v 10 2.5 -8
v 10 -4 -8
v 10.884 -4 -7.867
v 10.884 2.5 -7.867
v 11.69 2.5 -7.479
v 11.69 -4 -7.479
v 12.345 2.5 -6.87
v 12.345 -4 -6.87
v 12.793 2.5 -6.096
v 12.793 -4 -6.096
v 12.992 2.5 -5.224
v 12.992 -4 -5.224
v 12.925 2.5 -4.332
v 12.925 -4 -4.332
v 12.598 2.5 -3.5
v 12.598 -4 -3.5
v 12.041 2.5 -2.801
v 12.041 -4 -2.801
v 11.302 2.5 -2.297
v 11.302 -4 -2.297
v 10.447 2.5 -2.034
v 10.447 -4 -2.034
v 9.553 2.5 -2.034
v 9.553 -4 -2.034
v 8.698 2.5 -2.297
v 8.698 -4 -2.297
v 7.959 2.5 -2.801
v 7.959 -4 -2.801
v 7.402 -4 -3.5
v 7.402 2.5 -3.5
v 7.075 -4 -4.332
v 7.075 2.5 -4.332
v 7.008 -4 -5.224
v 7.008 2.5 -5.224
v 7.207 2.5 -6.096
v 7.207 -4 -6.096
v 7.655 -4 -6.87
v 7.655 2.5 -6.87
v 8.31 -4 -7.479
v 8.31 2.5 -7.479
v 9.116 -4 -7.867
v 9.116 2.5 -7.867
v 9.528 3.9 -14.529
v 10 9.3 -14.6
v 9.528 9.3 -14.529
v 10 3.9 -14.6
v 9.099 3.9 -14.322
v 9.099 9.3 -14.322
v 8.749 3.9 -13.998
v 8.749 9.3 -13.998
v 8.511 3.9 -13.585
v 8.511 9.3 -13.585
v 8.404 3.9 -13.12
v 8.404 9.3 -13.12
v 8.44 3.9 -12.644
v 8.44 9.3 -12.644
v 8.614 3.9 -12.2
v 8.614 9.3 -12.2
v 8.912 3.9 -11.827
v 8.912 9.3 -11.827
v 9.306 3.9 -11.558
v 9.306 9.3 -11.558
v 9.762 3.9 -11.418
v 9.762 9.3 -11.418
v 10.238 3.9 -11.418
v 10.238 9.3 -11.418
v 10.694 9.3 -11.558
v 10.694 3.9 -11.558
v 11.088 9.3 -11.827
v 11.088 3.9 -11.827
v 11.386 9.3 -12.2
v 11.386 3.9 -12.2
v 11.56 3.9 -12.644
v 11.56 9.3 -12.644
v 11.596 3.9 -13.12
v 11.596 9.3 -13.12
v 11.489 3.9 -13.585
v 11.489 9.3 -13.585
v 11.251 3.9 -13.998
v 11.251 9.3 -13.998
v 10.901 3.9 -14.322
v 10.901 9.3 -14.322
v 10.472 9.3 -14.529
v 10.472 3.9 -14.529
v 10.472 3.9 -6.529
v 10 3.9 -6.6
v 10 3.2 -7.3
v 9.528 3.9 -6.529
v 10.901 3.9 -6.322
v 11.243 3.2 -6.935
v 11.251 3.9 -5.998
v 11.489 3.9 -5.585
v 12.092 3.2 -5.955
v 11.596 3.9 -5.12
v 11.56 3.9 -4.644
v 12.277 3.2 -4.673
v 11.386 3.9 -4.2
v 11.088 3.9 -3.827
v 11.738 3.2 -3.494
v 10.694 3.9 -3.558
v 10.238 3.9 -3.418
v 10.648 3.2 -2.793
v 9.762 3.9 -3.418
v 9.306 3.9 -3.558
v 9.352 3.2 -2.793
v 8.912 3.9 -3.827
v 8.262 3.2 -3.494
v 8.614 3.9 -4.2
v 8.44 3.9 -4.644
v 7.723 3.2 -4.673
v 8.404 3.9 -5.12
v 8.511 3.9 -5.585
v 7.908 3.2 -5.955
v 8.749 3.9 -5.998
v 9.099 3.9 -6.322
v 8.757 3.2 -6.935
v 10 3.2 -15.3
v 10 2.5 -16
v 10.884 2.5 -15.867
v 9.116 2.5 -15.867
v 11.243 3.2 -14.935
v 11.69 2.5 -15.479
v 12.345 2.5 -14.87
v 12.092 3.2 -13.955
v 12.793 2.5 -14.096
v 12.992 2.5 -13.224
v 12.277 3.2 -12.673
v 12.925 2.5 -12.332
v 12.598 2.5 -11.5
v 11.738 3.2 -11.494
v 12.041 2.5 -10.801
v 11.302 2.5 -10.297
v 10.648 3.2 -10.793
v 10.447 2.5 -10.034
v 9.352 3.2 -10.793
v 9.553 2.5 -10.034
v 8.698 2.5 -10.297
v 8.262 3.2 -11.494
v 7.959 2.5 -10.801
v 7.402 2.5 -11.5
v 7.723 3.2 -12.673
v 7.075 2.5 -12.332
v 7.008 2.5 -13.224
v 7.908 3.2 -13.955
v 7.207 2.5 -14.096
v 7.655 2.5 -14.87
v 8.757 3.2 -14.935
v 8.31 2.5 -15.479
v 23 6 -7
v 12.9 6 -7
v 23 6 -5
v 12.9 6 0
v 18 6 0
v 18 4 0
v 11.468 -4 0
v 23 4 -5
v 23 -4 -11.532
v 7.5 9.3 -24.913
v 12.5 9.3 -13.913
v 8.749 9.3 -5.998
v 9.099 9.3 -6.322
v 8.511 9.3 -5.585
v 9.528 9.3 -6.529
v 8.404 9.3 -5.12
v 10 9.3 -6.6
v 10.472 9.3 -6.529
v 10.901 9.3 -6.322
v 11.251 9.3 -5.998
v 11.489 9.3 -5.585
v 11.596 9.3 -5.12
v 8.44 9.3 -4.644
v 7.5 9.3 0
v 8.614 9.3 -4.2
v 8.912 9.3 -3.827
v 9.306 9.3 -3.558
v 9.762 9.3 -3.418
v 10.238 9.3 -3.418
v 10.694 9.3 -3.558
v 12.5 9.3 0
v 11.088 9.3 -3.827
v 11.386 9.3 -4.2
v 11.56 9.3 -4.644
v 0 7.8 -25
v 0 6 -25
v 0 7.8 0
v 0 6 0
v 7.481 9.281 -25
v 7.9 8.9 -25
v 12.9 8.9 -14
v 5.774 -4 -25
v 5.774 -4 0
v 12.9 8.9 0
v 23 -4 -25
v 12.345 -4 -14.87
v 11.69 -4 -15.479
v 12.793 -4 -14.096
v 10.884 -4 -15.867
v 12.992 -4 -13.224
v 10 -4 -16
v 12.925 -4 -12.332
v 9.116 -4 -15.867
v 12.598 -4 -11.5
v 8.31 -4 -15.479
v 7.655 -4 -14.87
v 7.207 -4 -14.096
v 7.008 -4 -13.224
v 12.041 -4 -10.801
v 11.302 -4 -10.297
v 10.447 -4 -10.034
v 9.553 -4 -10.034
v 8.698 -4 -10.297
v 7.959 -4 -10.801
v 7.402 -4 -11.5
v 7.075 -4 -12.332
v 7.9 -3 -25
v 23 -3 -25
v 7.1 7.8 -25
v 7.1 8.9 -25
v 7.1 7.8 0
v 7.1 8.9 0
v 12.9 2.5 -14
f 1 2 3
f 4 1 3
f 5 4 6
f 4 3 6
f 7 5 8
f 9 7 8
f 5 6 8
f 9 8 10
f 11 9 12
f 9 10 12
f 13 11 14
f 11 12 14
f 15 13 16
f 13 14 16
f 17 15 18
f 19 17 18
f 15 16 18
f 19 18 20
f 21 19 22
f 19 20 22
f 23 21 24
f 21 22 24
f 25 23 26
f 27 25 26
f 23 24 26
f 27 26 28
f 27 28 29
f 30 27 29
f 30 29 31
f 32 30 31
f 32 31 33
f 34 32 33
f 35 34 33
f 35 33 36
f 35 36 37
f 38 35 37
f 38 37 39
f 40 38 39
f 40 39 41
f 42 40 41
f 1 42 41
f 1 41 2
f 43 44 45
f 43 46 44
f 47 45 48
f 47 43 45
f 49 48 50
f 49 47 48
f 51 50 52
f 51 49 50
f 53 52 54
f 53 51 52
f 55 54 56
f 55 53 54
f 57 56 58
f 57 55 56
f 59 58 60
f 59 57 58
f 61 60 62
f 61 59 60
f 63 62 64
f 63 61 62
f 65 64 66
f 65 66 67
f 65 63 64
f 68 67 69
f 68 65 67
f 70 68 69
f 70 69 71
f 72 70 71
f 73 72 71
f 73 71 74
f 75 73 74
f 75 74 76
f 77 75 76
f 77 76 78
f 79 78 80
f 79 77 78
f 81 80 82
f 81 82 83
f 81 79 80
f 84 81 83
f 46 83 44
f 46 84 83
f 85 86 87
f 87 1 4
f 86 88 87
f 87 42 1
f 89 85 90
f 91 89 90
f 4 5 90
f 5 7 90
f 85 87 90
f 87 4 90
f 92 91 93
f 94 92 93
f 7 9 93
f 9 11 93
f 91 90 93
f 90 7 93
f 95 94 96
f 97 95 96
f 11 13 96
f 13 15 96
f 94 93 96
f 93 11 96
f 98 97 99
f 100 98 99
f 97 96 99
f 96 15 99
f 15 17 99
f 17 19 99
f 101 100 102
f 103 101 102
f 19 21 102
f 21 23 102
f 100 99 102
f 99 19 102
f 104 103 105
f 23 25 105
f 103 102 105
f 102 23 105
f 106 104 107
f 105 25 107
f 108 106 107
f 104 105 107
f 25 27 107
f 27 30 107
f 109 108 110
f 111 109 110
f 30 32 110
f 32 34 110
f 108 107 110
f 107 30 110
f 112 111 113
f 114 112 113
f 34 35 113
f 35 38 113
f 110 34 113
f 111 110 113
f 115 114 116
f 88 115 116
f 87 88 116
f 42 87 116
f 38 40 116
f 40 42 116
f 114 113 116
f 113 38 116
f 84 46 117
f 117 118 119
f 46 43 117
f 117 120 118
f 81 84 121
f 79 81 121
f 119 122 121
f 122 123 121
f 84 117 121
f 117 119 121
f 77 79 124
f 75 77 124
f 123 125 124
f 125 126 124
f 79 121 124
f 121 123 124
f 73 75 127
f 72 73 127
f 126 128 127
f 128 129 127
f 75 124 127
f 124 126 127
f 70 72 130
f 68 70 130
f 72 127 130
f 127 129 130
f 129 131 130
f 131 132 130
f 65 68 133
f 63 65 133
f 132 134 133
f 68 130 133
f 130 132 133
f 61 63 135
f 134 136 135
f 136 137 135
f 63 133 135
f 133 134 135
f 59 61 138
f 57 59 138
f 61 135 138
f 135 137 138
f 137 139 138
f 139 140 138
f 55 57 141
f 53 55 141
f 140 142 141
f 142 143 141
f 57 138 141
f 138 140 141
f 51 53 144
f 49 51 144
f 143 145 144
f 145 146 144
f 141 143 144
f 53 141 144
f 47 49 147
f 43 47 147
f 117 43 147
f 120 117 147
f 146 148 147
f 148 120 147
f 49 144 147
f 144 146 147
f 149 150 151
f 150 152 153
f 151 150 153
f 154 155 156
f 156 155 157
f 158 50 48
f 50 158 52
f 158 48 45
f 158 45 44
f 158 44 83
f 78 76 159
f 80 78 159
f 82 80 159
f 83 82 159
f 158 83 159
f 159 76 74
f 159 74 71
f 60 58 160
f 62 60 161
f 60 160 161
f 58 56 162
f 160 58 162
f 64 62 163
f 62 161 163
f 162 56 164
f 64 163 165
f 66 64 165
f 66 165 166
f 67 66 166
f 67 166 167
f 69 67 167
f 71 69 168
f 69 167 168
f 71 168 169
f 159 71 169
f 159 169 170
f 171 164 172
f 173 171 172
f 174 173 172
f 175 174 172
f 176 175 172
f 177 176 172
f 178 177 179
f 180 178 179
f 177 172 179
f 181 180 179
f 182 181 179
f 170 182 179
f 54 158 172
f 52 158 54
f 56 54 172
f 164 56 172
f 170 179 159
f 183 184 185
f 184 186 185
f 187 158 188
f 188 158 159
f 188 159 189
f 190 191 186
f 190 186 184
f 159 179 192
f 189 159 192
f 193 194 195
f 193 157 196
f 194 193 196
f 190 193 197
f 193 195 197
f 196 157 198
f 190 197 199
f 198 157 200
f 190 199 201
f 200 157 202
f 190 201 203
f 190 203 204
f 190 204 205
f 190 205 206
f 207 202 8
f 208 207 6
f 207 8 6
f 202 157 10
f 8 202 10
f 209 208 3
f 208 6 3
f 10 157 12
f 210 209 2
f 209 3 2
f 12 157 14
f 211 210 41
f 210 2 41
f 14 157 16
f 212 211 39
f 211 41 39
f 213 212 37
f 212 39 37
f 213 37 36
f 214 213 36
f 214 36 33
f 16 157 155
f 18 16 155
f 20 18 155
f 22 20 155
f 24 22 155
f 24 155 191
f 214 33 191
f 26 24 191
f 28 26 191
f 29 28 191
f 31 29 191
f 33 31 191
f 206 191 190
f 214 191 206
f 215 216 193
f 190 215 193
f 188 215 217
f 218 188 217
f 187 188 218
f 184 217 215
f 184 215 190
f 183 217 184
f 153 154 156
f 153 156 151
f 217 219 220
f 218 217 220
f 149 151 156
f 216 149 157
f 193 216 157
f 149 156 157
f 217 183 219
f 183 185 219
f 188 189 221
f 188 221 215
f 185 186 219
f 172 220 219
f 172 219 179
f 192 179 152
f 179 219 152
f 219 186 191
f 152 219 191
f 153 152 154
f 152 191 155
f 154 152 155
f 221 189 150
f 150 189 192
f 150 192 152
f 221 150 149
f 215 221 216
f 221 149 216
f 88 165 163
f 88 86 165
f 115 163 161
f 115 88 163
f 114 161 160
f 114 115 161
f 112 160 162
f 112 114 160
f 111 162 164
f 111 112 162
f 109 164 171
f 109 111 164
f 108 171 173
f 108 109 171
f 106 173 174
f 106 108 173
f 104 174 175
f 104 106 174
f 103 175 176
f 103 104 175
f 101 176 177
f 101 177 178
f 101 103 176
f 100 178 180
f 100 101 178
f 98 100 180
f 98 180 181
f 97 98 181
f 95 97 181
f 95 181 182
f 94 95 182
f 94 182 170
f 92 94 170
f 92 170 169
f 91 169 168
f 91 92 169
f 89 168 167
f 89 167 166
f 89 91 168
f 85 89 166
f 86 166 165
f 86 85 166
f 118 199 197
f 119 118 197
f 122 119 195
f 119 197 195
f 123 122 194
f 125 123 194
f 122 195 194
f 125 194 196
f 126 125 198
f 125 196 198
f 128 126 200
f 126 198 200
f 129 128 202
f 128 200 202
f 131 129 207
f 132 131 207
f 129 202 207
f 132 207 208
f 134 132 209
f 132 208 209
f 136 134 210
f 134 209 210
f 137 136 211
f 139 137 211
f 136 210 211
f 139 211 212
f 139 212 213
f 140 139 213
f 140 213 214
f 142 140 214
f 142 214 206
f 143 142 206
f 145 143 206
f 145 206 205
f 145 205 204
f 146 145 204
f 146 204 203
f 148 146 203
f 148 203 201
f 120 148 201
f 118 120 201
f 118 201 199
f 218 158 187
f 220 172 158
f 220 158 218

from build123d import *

# Parameters (mm, degrees)
SKETCH_1_W           = 20
SKETCH_1_H           = 20
EXTRUDE_1_DEPTH      = 4
SKETCH_2_W           = 12.9
SKETCH_2_H           = 20
EXTRUDE_2_DEPTH      = 3.8
SKETCH_3_R           = 1.6
CUT_EXTRUDE_1_DEPTH  = 30.340074983
SKETCH_4_W           = 5.8
SKETCH_4_H           = 20
SKETCH_4_R           = 1.6
EXTRUDE_3_DEPTH      = 1.5
SKETCH_5_R           = 3
CUT_EXTRUDE_3_DEPTH  = 2.4
SKETCH_6_W           = 20
SKETCH_6_H           = 4
EXTRUDE_4_DEPTH      = 3
EXTRUDE_START        = 4
SKETCH_7_W           = 23
SKETCH_7_H           = 20
SKETCH_7_R           = 3
EXTRUDE_5_DEPTH      = 4
SKETCH_9_W           = 10.1
SKETCH_9_H           = 20
EXTRUDE_6_DEPTH      = 2
EXTRUDE_7_DEPTH      = 5
CHAMFER_7_SIZE       = 10
CHAMFER_7_SIZE2      = 5.773502692
CHAMFER_8_SIZE       = 5
CHAMFER_9_SIZE       = 8
CHAMFER_9_SIZE2      = 4.618802154
CUT_EXTRUDE_9_DEPTH  = 10.1
CUT_EXTRUDE_10_REACH = 38.481
CHAMFER_10_SIZE      = 1.5
CHAMFER_11_SIZE      = 0.4


with BuildPart() as part:
    # 草图1 → 凸台-拉伸1 (new body)
    with BuildSketch(Plane(origin=(0, 0, 0), x_dir=(1, 0, 0), z_dir=(0, 1, 0))):
        with Locations((10, 10)):
            Rectangle(SKETCH_1_W, SKETCH_1_H)
    extrude(amount=EXTRUDE_1_DEPTH)

    # 草图2 → 凸台-拉伸2 (add)
    with BuildSketch(Plane(origin=(0, 4, 0), x_dir=(1, 0, 0), z_dir=(0, 1, 0))):
        with Locations((6.45, 10)):
            Rectangle(SKETCH_2_W, SKETCH_2_H)
    extrude(amount=EXTRUDE_2_DEPTH)

    # 草图3 → 切除-拉伸1 (cut, through all)
    with BuildSketch(Plane(origin=(0, 0, 0), x_dir=(-1, 0, 0), z_dir=(0, -1, 0))):
        with Locations(Location((-10, 5, 0), (0, 0, 90))):
            Circle(SKETCH_3_R)
        with Locations(Location((-10, 13, 0), (0, 0, 90))):
            Circle(SKETCH_3_R)
    extrude(amount=-CUT_EXTRUDE_1_DEPTH, mode=Mode.SUBTRACT)

    # 草图4 → 凸台-拉伸3 (add)
    with BuildSketch(Plane(origin=(0, 7.8, 0), x_dir=(1, 0, 0), z_dir=(0, 1, 0))):
        with Locations((10, 10)):
            Rectangle(SKETCH_4_W, SKETCH_4_H)
        with Locations(Location((10, 13, 0), (0, 0, 90))):
            Circle(SKETCH_4_R, mode=Mode.SUBTRACT)
        with Locations(Location((10, 5, 0), (0, 0, 90))):
            Circle(SKETCH_4_R, mode=Mode.SUBTRACT)
    extrude(amount=EXTRUDE_3_DEPTH)

    # 草图5 → 切除-拉伸3 (cut)
    with BuildSketch(Plane(origin=(0, 0, 0), x_dir=(-1, 0, 0), z_dir=(0, -1, 0))):
        with Locations(Location((-10, 5, 0), (0, 0, 90))):
            Circle(SKETCH_5_R)
        with Locations(Location((-10, 13, 0), (0, 0, 90))):
            Circle(SKETCH_5_R)
    extrude(amount=-CUT_EXTRUDE_3_DEPTH, mode=Mode.SUBTRACT)

    # 草图6 → 凸台-拉伸4 (add)
    with BuildSketch(Plane(origin=(20, 0, 0), x_dir=(0, 0, -1), z_dir=(1, 0, 0))):
        with Locations((10, 2)):
            Rectangle(SKETCH_6_W, SKETCH_6_H)
    extrude(amount=EXTRUDE_4_DEPTH)

    # 草图7 → 凸台-拉伸5 (add)
    with BuildSketch(Plane(origin=(0, 0, 0), x_dir=(-1, 0, 0), z_dir=(0, -1, 0)).offset(EXTRUDE_START)):
        with Locations((-11.5, 10)):
            Rectangle(SKETCH_7_W, SKETCH_7_H)
        with Locations(Location((-10, 13, 0), (0, 0, 90))):
            Circle(SKETCH_7_R, mode=Mode.SUBTRACT)
        with Locations(Location((-10, 5, 0), (0, 0, 90))):
            Circle(SKETCH_7_R, mode=Mode.SUBTRACT)
    extrude(amount=-EXTRUDE_5_DEPTH)

    # 草图9 → 凸台-拉伸6 (add)
    with BuildSketch(Plane(origin=(0, 4, 0), x_dir=(1, 0, 0), z_dir=(0, 1, 0))):
        with Locations((17.95, 10)):
            Rectangle(SKETCH_9_W, SKETCH_9_H)
    extrude(amount=EXTRUDE_6_DEPTH)

    # 草图11 → 凸台-拉伸7 (add)
    with BuildSketch(Plane(origin=(0, 0, -20), x_dir=(-1, 0, 0), z_dir=(0, 0, -1))):
        Polygon((-23, 6), (-23, -4), (0, -4), (0, 7.8), (-7.1, 7.8), (-7.1, 9.3), (-12.9, 9.3), (-12.9, 6), align=None)
    extrude(amount=EXTRUDE_7_DEPTH)

    # 倒角7
    chamfer_7_edges = [part.edges().sort_by_distance(p)[0] for p in [
        (0, -4, -12.5),
    ]]
    chamfer_7_side = [part.faces().sort_by_distance(p)[0] for p in [
        (0, 1.9, -12.5),
    ]]
    chamfer(chamfer_7_edges, length=CHAMFER_7_SIZE, length2=CHAMFER_7_SIZE2, reference=chamfer_7_side[0])

    # 倒角8
    chamfer_8_edges = [part.edges().sort_by_distance(p)[0] for p in [
        (23, 1, 0),
    ]]
    chamfer(chamfer_8_edges, length=CHAMFER_8_SIZE)

    # 倒角9
    chamfer_9_edges = [part.edges().sort_by_distance(p)[0] for p in [
        (20.5, -4, -2.5),
    ]]
    chamfer_9_side = [part.faces().sort_by_distance(p)[0] for p in [
        (20.5, 1, -2.5),
    ]]
    chamfer(chamfer_9_edges, length=CHAMFER_9_SIZE, length2=CHAMFER_9_SIZE2, reference=chamfer_9_side[0])

    # 草图15 → 切除-拉伸9 (cut)
    with BuildSketch(Plane(origin=(23, 0, 0), x_dir=(0, 0, -1), z_dir=(1, 0, 0))):
        Polygon((25, -3), (25, 6), (7, 6), align=None)
    extrude(amount=-CUT_EXTRUDE_9_DEPTH, mode=Mode.SUBTRACT)

    # 切除-拉伸10: up to this plane
    cut_extrude_10_end = Plane(origin=(-7.224611797, 6, -7), z_dir=(0, -0.894427190999916, 0.447213595499958))
    # 草图16 → 切除-拉伸10 (cut, up to the surface)
    with BuildSketch(Plane(origin=(0, 9.3, 0), x_dir=(1, 0, 0), z_dir=(0, 1, 0)), mode=Mode.PRIVATE) as cut_extrude_10_sk1:
        Polygon((7.9, 25), (12.9, 25), (12.9, 14), align=None)
    cut_extrude_10_tool1 = split(extrude(cut_extrude_10_sk1.sketch, amount=-CUT_EXTRUDE_10_REACH, mode=Mode.PRIVATE), bisect_by=cut_extrude_10_end, keep=Keep.BOTH, mode=Mode.PRIVATE)
    add(cut_extrude_10_tool1.solids().sort_by_distance((11.233333, 9.3, -21.333333))[0], mode=Mode.SUBTRACT)

    # 倒角10
    # the kernel refuses this chamfer: 1.5 mm, written as the material it takes off along each edge
    with BuildSketch(Plane(origin=(10, 2.4, -13), x_dir=(0, 0, -1), z_dir=(-1, 0, 0))) as chamfer_10_piece_1_section:
        Polygon((1.6, -CHAMFER_10_SIZE), (1.6 + CHAMFER_10_SIZE, 0), (1.6, 0), align=None)
    chamfer_10_piece_1 = revolve(axis=Axis((10, 2.4, -13), (0, -1, 0)), mode=Mode.PRIVATE)
    chamfer_10_piece_1 = chamfer_10_piece_1 & Plane(origin=(10, 2.4, -13), x_dir=(0, 0, -1), z_dir=(0, -1, 0)) * Cylinder(3, 13, mode=Mode.PRIVATE)
    add(chamfer_10_piece_1, mode=Mode.SUBTRACT)
    with BuildSketch(Plane(origin=(10, 2.4, -5), x_dir=(0, 0, -1), z_dir=(-1, 0, 0))) as chamfer_10_piece_2_section:
        Polygon((1.6, -CHAMFER_10_SIZE), (1.6 + CHAMFER_10_SIZE, 0), (1.6, 0), align=None)
    chamfer_10_piece_2 = revolve(axis=Axis((10, 2.4, -5), (0, -1, 0)), mode=Mode.PRIVATE)
    chamfer_10_piece_2 = chamfer_10_piece_2 & Plane(origin=(10, 2.4, -5), x_dir=(0, 0, -1), z_dir=(0, -1, 0)) * Cylinder(3, 13, mode=Mode.PRIVATE)
    add(chamfer_10_piece_2, mode=Mode.SUBTRACT)

    # 倒角11
    # the kernel refuses this chamfer: 0.4 mm, written as the material it takes off along each edge
    with BuildSketch(Plane(origin=(13.325667997, 9.3, -13.063530407), x_dir=(-0.9103664774626047, 4.440892098500618e-15, 0.41380294430118414), z_dir=(-0.4138029443011842, 0, -0.9103664774626047))) as chamfer_11_piece_1:
        Polygon((CHAMFER_11_SIZE, 0), (0, -CHAMFER_11_SIZE), (0, 0), align=None)
    extrude(amount=14.140392364, mode=Mode.SUBTRACT)
    with BuildSketch(Plane(origin=(12.9, 9.3, 1.028673195), x_dir=(-1, 0, 0), z_dir=(0, 0, -1))) as chamfer_11_piece_2:
        Polygon((CHAMFER_11_SIZE, 0), (0, -CHAMFER_11_SIZE), (0, 0), align=None)
    extrude(amount=16.05734639, mode=Mode.SUBTRACT)
    with BuildSketch(Plane(origin=(7.1, 9.3, 1.028673195), x_dir=(1, 0, 0), z_dir=(0, 0, -1))) as chamfer_11_piece_3:
        Polygon((CHAMFER_11_SIZE, 0), (0, CHAMFER_11_SIZE), (0, 0), align=None)
    extrude(amount=27.05734639, mode=Mode.SUBTRACT)


solid = part.part
